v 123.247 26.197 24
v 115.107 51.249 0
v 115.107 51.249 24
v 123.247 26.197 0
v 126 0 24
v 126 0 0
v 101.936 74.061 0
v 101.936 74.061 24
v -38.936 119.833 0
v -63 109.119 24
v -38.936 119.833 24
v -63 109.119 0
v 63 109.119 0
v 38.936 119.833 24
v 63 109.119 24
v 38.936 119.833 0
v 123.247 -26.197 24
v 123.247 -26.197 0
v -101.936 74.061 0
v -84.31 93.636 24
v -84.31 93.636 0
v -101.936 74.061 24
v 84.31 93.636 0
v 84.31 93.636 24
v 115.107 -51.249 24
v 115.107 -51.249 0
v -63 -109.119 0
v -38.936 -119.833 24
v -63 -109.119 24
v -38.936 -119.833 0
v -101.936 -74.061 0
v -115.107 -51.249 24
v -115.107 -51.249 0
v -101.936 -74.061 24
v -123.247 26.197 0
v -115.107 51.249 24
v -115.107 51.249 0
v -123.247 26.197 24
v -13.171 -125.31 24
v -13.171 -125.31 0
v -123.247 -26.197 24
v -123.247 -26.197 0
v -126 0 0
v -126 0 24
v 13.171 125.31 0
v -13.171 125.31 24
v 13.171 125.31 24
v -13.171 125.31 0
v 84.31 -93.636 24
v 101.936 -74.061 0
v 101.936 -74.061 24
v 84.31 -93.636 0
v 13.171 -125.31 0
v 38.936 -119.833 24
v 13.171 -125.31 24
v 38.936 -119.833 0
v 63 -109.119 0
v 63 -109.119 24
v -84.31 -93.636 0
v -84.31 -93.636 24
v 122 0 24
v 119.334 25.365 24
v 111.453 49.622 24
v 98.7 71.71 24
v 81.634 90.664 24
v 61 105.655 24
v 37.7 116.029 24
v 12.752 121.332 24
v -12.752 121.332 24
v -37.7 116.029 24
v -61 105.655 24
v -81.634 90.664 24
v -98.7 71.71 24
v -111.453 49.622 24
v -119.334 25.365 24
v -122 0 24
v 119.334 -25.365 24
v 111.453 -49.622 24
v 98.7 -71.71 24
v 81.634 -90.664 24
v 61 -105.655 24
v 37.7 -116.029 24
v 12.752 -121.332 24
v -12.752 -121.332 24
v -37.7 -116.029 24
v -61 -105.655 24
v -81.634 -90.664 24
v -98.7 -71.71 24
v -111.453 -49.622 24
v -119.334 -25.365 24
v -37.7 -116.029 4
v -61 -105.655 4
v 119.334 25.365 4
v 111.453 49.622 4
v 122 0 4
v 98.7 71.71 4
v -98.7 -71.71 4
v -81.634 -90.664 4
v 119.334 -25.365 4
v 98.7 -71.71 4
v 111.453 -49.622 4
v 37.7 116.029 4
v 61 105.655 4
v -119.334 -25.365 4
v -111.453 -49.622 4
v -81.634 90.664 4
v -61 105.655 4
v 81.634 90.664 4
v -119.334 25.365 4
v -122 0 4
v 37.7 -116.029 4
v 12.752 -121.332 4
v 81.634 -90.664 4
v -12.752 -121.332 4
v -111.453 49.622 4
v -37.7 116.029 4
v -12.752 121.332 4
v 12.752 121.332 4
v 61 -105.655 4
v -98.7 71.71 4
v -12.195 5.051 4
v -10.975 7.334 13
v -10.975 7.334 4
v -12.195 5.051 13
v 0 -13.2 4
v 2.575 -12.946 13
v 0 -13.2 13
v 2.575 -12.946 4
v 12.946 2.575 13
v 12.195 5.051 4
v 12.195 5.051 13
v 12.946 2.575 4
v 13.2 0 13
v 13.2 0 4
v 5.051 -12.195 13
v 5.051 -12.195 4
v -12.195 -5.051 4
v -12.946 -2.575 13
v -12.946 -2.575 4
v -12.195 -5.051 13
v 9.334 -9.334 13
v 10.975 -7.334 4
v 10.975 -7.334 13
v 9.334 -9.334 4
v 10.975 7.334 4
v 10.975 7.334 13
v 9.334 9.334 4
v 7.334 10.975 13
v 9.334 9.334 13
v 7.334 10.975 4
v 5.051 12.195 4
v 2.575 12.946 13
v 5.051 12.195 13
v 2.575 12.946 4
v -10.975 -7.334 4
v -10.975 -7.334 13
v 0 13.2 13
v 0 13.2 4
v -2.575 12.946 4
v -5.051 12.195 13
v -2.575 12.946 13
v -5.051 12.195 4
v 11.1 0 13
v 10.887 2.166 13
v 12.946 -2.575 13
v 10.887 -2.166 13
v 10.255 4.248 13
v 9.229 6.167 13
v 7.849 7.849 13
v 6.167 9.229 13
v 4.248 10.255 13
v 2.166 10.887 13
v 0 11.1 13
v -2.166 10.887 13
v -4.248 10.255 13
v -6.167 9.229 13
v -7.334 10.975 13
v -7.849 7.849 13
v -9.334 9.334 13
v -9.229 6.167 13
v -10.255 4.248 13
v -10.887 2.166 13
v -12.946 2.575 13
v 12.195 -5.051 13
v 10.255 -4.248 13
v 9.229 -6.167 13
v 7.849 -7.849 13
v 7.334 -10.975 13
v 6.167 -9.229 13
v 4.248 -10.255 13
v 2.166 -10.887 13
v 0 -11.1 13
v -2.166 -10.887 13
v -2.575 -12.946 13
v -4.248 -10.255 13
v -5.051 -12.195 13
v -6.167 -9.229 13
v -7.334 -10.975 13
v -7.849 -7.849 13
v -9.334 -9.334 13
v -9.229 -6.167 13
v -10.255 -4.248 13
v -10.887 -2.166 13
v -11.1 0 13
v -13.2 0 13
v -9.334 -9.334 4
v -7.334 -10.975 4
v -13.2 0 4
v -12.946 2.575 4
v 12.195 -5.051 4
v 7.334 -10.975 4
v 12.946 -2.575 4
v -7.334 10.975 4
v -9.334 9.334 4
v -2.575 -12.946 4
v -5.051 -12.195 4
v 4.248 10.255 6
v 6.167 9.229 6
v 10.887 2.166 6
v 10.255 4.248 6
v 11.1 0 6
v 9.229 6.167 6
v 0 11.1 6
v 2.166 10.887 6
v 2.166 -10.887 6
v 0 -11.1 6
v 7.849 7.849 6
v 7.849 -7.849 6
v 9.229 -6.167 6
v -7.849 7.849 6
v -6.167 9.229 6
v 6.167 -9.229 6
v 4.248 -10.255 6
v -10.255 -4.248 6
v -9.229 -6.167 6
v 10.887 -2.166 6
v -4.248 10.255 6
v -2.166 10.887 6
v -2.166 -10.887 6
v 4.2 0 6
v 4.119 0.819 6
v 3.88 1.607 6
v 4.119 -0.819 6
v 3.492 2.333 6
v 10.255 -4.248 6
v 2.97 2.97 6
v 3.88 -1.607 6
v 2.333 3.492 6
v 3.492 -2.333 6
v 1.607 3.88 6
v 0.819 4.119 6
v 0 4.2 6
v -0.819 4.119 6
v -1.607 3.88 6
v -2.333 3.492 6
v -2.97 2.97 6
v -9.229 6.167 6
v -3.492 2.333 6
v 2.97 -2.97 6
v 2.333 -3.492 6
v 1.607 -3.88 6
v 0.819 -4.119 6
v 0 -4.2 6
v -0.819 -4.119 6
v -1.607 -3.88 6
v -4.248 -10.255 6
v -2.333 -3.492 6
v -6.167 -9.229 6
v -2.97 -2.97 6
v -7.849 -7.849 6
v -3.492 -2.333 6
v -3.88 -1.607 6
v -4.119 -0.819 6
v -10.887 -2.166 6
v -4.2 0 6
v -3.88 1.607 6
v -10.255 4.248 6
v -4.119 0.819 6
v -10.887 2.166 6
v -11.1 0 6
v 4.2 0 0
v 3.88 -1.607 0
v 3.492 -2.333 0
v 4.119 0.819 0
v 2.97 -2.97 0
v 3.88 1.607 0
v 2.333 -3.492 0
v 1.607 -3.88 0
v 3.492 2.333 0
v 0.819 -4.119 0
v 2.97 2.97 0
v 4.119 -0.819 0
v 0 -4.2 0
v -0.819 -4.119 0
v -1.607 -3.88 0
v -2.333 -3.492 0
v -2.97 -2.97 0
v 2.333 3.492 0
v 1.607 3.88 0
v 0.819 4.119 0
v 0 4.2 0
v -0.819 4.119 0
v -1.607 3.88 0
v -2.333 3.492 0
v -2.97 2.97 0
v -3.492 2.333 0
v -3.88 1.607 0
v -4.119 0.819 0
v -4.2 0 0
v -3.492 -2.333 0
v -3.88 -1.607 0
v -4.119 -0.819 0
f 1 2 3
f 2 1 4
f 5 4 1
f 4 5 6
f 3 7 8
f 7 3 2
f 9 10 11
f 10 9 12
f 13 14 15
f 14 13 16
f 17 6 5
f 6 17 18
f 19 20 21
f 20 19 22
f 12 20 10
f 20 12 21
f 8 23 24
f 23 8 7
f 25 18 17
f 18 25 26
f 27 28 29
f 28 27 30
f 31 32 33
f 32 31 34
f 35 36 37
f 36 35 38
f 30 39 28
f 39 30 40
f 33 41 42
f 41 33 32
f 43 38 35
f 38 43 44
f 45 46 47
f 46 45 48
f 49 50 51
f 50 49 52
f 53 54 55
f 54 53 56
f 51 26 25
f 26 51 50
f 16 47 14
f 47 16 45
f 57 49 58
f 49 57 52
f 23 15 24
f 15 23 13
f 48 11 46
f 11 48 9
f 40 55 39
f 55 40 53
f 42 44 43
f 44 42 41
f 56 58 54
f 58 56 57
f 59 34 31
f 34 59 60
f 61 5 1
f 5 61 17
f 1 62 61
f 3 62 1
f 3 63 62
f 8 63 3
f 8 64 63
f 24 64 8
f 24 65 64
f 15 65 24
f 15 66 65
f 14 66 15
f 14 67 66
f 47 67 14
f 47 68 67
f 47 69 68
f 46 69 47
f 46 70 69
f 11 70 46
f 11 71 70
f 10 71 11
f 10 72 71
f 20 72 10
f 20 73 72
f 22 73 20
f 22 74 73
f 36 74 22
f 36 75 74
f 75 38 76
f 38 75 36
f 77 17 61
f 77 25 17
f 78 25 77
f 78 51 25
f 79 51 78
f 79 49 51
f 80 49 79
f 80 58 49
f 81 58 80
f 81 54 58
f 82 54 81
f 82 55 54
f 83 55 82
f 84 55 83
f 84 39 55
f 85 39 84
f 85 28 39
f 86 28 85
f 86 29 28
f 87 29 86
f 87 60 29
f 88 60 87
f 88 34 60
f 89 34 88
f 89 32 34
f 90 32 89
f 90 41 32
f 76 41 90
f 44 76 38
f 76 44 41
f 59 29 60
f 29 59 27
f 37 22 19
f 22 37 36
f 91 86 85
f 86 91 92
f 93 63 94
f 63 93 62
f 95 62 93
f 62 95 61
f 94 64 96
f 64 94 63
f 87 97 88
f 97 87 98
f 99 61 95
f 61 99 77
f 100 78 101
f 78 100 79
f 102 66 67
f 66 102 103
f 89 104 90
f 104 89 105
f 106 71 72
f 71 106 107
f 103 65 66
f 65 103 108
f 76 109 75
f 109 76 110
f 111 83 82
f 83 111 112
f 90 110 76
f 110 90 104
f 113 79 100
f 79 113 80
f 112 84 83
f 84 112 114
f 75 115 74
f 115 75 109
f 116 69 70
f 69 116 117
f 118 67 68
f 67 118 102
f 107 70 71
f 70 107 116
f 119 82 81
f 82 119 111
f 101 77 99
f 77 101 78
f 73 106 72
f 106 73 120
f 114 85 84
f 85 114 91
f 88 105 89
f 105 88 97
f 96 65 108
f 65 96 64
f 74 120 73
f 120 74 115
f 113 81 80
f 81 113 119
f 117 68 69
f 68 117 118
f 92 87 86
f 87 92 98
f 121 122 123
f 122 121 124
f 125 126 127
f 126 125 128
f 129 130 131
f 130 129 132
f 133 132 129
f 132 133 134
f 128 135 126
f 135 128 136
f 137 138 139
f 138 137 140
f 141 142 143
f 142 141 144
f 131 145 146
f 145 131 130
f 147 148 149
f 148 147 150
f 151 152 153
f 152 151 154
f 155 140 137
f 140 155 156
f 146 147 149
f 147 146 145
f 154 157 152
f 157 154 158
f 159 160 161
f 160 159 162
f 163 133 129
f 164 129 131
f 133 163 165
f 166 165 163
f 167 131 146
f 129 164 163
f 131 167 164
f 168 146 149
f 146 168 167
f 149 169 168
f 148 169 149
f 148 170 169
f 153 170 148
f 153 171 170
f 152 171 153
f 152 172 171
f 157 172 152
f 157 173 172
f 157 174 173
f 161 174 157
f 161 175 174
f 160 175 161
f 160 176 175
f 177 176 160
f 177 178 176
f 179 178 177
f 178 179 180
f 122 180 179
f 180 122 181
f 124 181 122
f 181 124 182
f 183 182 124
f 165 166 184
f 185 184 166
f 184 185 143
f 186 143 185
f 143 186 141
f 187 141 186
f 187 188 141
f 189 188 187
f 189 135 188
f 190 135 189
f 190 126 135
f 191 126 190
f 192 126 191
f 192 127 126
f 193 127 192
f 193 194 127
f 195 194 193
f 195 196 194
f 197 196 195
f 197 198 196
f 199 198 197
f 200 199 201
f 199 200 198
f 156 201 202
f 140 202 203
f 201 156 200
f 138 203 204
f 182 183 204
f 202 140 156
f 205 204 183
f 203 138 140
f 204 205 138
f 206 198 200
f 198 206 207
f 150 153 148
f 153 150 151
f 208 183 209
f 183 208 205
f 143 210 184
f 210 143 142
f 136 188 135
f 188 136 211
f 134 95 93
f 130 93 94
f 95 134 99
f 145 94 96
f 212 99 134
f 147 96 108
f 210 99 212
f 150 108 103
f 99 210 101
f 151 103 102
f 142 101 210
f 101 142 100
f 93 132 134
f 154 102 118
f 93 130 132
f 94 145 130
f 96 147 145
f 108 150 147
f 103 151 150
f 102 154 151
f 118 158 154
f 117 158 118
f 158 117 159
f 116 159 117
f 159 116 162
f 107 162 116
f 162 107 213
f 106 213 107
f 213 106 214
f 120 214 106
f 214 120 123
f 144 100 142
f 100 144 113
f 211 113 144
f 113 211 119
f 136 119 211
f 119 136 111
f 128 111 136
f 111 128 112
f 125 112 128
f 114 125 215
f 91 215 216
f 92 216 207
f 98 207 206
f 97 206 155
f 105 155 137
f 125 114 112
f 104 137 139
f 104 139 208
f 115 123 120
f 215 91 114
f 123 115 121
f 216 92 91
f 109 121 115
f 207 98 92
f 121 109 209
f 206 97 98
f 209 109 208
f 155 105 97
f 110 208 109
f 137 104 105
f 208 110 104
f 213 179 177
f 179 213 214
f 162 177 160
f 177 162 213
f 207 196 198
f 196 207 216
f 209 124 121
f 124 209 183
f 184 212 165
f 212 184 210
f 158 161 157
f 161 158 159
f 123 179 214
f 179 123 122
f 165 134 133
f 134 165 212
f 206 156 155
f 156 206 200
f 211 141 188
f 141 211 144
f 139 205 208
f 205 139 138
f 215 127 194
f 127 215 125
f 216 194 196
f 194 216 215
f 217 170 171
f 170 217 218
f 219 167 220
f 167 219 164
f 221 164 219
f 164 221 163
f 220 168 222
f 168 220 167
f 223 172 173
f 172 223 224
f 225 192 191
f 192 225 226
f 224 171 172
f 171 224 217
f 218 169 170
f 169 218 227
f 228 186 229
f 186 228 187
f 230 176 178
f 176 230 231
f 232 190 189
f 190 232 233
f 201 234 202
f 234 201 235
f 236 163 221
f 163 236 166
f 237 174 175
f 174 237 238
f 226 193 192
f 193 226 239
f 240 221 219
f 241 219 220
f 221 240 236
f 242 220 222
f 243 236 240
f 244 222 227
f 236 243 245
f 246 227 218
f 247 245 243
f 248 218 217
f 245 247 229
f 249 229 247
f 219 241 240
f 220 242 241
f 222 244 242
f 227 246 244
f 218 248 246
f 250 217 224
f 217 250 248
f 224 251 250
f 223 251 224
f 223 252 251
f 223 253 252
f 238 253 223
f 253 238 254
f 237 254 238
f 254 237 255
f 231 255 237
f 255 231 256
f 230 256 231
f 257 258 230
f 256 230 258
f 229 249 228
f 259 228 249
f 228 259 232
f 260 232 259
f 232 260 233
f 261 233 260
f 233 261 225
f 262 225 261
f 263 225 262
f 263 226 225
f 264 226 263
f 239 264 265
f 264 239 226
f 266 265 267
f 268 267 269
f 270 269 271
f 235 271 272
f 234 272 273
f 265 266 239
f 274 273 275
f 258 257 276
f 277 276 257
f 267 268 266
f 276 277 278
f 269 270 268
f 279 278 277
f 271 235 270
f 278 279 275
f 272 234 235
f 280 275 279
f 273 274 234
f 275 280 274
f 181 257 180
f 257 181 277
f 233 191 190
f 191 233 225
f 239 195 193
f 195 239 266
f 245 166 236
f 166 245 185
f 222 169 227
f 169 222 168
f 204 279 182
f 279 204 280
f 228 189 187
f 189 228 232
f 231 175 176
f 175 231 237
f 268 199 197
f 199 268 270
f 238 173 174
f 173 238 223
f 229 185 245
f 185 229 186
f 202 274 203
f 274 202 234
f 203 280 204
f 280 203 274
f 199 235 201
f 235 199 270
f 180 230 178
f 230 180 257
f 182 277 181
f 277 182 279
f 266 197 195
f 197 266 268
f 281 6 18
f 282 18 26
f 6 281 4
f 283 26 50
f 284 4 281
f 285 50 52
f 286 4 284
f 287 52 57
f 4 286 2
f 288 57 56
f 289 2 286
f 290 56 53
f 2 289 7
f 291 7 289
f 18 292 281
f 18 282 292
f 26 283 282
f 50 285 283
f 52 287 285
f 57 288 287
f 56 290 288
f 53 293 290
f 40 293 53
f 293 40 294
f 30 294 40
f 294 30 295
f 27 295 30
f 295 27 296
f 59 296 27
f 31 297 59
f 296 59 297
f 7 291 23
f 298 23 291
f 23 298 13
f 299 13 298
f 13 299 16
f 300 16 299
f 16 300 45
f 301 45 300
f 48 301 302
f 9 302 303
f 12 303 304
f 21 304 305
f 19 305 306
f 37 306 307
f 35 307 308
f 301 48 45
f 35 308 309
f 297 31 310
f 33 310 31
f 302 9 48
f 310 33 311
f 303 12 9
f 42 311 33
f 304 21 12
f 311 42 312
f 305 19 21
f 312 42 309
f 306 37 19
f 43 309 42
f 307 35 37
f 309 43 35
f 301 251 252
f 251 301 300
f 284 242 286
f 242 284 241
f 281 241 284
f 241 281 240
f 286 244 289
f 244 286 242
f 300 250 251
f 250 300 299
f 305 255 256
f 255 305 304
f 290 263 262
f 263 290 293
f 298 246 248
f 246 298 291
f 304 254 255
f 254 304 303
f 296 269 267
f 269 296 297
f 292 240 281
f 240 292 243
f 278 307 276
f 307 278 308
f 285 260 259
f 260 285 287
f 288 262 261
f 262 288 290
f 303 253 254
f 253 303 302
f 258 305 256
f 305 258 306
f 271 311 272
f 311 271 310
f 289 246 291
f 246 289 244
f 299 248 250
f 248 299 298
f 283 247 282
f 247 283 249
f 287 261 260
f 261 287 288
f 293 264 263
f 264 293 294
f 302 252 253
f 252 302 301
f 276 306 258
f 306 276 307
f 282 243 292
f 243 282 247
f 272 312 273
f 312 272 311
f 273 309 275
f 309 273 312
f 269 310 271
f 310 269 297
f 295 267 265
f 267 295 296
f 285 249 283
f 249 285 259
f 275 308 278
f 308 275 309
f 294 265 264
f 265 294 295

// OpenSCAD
// file: commons.scad
module rect_prism(width, height, p0, p1) {
    dir = p1 - p0;
    h = norm(dir);
    if (dir[0] == 0 && dir[1] == 0) {
        // no transformation necessary
        translate(p0)
        translate([0, 0, h/2])
        cube([size, size, h], center = true);
    }
    else {
        w  = dir / h;
        u0 = cross(w, [0,0,1]);
        u  = u0 / norm(u0);
        v0 = cross(w, u);
        v  = v0 / norm(v0);
        multmatrix(m=[[u[0], v[0], w[0], p0.x],
                      [u[1], v[1], w[1], p0.y],
                      [u[2], v[2], w[2], p0.z],
                      [0,    0,    0,    1]])
        translate([0, 0, h/2])
        cube([width, height, h], center = true);
    }
}

module square_prism(size, p0, p1) {
    rect_prism(size, size, p0, p1);
}

module point_plate(thickness, point_array, indices, fn = 8) {
    hull() {
        for (i = indices) {
            translate(point_array[i])
            sphere(d = thickness, $fn = fn);
        }
    }
}
// file: carousel-config.scad
// ----------------------------------------------------------------------------
// Configuration of the carousel and its components.
//
// All the values beyod "---- derived" string in each of the sections should
// not be modified manually, as they are derived from the previously defined
// parameters in some way...
// ----------------------------------------------------------------------------

// Generic parameters to address consistency & interconnections of parts.
CYL_FN = 32; // BEWARE!!! set to +- 256 for STL export!
BLEED = 0.5; // overlap for union & difference operations
EASE = 0.2; // socket/pin ease for interconnecting of parts & holes

// Core defining shape of our carousel is N-faced cylinder.
// This affects most of the subsequent parameter definitions & usage.
CAROUSEL_FACE_COUNT = 6;
CAROUSEL_ESCRIBED_RADIUS = 120;
// ---- derived
CAROUSEL_INSCRIBED_RADIUS = CAROUSEL_ESCRIBED_RADIUS * cos(180/CAROUSEL_FACE_COUNT);

// Base of the carousel -> stand that holds the axle, walls, etc.
BASE_TOTAL_HEIGHT = 24;
BASE_FLOOR_THICKNESS = 4;
BASE_WALL_THICKNESS = 4;

// Face, or, a wall of the carousel "shell".
FACE_HEIGHT = 150;
FACE_THICKNESS = 5;
// ---- derived
FACE_WIDTH = CAROUSEL_ESCRIBED_RADIUS * 2 * sin(180/CAROUSEL_FACE_COUNT);
FACE_ANGLE = (1 - 2/CAROUSEL_FACE_COUNT)*180;
FACE_APOTHEM_LEN = FACE_WIDTH / (2 * tan(180/CAROUSEL_FACE_COUNT));
FACE_DOOR_HEIGHT = 0.66 * FACE_HEIGHT;
FACE_DOOR_WIDTH = 0.75 * FACE_WIDTH;

// Roof of the carousel.
ROOF_THICKNESS = 1;
ROOF_HEIGHT = 0.3 * FACE_HEIGHT;

// Ball bearing - real-life dimensions of ball bearing used to "power" the axle.
BEARING_OUTER_D = 22;
BEARING_INNER_D = 8;
BEARING_HEIGHT = 7;
BEARING_SHELL_THICKNESS = 2;

// Axle rotating inside carousel.
AXLE_RADIUS = 4;

// Rotating rig carrying the seats.
RIG_HEIGHT = 6;
RIG_STR = 6;

// Abstract "rings" carrying seats, and their distance off the carousel center
// as a fraction of radius.
RIG_RING_POSITIONS = [0.3, 0.6, 0.9];
RIG_MAX_R = 0.90 * CAROUSEL_INSCRIBED_RADIUS;
// main file
include <carousel-config.scad>;
use <commons.scad>;

BASE_RADIUS = 1.05 * CAROUSEL_ESCRIBED_RADIUS; // to include/cover carousel walls

module _bearing_socket() {
    difference() {
        // socket body
        cylinder(h = BEARING_SHELL_THICKNESS + BEARING_HEIGHT, r = 0.5 * BEARING_OUTER_D + EASE + BEARING_SHELL_THICKNESS, $fn = CYL_FN);
        // bearing slot
        translate([0, 0, BEARING_SHELL_THICKNESS])
        cylinder(h = BEARING_HEIGHT + EASE, d = BEARING_OUTER_D + EASE, $fn = CYL_FN);
    }
}

module carousel_base() {
    color("BurlyWood")
    difference() {
        union() {
            // floor plate
            cylinder(h = BASE_FLOOR_THICKNESS, r = BASE_RADIUS);
            // rim/side wall
            edge_height = BASE_TOTAL_HEIGHT - BASE_FLOOR_THICKNESS + BLEED;
            translate([0, 0, BASE_FLOOR_THICKNESS - BLEED])
            difference() {
                cylinder(h = edge_height, r = BASE_RADIUS);
                translate([0, 0, -0.5 * BLEED])
                cylinder(h = edge_height + BLEED, r = BASE_RADIUS - BASE_WALL_THICKNESS);
            }
            // bearing socket
            assert(BASE_FLOOR_THICKNESS + BEARING_HEIGHT < BASE_TOTAL_HEIGHT, "Bearing height is too big to fit into raised base");
            translate([0, 0, BASE_FLOOR_THICKNESS])
            _bearing_socket();
        }
        translate([0, 0, -0.5 * BLEED])
        cylinder(h = BASE_TOTAL_HEIGHT + BLEED, r = AXLE_RADIUS + EASE, $fn = CYL_FN);
    }
}

module base_part(n = CAROUSEL_FACE_COUNT) {
    xx = 2 * (BASE_RADIUS + EASE);
    yy = BASE_RADIUS + 2 * EASE;
    zz = 2 * (BASE_TOTAL_HEIGHT + EASE);
    difference() {
        carousel_base();
        translate([0, -0.5*yy, 0])
            cube([xx, yy, zz], center = true);
        rotate(360/n)
        translate([0, 0.5 * yy, 0])
            cube([xx, yy, zz], center = true);
    }
}

carousel_base();
